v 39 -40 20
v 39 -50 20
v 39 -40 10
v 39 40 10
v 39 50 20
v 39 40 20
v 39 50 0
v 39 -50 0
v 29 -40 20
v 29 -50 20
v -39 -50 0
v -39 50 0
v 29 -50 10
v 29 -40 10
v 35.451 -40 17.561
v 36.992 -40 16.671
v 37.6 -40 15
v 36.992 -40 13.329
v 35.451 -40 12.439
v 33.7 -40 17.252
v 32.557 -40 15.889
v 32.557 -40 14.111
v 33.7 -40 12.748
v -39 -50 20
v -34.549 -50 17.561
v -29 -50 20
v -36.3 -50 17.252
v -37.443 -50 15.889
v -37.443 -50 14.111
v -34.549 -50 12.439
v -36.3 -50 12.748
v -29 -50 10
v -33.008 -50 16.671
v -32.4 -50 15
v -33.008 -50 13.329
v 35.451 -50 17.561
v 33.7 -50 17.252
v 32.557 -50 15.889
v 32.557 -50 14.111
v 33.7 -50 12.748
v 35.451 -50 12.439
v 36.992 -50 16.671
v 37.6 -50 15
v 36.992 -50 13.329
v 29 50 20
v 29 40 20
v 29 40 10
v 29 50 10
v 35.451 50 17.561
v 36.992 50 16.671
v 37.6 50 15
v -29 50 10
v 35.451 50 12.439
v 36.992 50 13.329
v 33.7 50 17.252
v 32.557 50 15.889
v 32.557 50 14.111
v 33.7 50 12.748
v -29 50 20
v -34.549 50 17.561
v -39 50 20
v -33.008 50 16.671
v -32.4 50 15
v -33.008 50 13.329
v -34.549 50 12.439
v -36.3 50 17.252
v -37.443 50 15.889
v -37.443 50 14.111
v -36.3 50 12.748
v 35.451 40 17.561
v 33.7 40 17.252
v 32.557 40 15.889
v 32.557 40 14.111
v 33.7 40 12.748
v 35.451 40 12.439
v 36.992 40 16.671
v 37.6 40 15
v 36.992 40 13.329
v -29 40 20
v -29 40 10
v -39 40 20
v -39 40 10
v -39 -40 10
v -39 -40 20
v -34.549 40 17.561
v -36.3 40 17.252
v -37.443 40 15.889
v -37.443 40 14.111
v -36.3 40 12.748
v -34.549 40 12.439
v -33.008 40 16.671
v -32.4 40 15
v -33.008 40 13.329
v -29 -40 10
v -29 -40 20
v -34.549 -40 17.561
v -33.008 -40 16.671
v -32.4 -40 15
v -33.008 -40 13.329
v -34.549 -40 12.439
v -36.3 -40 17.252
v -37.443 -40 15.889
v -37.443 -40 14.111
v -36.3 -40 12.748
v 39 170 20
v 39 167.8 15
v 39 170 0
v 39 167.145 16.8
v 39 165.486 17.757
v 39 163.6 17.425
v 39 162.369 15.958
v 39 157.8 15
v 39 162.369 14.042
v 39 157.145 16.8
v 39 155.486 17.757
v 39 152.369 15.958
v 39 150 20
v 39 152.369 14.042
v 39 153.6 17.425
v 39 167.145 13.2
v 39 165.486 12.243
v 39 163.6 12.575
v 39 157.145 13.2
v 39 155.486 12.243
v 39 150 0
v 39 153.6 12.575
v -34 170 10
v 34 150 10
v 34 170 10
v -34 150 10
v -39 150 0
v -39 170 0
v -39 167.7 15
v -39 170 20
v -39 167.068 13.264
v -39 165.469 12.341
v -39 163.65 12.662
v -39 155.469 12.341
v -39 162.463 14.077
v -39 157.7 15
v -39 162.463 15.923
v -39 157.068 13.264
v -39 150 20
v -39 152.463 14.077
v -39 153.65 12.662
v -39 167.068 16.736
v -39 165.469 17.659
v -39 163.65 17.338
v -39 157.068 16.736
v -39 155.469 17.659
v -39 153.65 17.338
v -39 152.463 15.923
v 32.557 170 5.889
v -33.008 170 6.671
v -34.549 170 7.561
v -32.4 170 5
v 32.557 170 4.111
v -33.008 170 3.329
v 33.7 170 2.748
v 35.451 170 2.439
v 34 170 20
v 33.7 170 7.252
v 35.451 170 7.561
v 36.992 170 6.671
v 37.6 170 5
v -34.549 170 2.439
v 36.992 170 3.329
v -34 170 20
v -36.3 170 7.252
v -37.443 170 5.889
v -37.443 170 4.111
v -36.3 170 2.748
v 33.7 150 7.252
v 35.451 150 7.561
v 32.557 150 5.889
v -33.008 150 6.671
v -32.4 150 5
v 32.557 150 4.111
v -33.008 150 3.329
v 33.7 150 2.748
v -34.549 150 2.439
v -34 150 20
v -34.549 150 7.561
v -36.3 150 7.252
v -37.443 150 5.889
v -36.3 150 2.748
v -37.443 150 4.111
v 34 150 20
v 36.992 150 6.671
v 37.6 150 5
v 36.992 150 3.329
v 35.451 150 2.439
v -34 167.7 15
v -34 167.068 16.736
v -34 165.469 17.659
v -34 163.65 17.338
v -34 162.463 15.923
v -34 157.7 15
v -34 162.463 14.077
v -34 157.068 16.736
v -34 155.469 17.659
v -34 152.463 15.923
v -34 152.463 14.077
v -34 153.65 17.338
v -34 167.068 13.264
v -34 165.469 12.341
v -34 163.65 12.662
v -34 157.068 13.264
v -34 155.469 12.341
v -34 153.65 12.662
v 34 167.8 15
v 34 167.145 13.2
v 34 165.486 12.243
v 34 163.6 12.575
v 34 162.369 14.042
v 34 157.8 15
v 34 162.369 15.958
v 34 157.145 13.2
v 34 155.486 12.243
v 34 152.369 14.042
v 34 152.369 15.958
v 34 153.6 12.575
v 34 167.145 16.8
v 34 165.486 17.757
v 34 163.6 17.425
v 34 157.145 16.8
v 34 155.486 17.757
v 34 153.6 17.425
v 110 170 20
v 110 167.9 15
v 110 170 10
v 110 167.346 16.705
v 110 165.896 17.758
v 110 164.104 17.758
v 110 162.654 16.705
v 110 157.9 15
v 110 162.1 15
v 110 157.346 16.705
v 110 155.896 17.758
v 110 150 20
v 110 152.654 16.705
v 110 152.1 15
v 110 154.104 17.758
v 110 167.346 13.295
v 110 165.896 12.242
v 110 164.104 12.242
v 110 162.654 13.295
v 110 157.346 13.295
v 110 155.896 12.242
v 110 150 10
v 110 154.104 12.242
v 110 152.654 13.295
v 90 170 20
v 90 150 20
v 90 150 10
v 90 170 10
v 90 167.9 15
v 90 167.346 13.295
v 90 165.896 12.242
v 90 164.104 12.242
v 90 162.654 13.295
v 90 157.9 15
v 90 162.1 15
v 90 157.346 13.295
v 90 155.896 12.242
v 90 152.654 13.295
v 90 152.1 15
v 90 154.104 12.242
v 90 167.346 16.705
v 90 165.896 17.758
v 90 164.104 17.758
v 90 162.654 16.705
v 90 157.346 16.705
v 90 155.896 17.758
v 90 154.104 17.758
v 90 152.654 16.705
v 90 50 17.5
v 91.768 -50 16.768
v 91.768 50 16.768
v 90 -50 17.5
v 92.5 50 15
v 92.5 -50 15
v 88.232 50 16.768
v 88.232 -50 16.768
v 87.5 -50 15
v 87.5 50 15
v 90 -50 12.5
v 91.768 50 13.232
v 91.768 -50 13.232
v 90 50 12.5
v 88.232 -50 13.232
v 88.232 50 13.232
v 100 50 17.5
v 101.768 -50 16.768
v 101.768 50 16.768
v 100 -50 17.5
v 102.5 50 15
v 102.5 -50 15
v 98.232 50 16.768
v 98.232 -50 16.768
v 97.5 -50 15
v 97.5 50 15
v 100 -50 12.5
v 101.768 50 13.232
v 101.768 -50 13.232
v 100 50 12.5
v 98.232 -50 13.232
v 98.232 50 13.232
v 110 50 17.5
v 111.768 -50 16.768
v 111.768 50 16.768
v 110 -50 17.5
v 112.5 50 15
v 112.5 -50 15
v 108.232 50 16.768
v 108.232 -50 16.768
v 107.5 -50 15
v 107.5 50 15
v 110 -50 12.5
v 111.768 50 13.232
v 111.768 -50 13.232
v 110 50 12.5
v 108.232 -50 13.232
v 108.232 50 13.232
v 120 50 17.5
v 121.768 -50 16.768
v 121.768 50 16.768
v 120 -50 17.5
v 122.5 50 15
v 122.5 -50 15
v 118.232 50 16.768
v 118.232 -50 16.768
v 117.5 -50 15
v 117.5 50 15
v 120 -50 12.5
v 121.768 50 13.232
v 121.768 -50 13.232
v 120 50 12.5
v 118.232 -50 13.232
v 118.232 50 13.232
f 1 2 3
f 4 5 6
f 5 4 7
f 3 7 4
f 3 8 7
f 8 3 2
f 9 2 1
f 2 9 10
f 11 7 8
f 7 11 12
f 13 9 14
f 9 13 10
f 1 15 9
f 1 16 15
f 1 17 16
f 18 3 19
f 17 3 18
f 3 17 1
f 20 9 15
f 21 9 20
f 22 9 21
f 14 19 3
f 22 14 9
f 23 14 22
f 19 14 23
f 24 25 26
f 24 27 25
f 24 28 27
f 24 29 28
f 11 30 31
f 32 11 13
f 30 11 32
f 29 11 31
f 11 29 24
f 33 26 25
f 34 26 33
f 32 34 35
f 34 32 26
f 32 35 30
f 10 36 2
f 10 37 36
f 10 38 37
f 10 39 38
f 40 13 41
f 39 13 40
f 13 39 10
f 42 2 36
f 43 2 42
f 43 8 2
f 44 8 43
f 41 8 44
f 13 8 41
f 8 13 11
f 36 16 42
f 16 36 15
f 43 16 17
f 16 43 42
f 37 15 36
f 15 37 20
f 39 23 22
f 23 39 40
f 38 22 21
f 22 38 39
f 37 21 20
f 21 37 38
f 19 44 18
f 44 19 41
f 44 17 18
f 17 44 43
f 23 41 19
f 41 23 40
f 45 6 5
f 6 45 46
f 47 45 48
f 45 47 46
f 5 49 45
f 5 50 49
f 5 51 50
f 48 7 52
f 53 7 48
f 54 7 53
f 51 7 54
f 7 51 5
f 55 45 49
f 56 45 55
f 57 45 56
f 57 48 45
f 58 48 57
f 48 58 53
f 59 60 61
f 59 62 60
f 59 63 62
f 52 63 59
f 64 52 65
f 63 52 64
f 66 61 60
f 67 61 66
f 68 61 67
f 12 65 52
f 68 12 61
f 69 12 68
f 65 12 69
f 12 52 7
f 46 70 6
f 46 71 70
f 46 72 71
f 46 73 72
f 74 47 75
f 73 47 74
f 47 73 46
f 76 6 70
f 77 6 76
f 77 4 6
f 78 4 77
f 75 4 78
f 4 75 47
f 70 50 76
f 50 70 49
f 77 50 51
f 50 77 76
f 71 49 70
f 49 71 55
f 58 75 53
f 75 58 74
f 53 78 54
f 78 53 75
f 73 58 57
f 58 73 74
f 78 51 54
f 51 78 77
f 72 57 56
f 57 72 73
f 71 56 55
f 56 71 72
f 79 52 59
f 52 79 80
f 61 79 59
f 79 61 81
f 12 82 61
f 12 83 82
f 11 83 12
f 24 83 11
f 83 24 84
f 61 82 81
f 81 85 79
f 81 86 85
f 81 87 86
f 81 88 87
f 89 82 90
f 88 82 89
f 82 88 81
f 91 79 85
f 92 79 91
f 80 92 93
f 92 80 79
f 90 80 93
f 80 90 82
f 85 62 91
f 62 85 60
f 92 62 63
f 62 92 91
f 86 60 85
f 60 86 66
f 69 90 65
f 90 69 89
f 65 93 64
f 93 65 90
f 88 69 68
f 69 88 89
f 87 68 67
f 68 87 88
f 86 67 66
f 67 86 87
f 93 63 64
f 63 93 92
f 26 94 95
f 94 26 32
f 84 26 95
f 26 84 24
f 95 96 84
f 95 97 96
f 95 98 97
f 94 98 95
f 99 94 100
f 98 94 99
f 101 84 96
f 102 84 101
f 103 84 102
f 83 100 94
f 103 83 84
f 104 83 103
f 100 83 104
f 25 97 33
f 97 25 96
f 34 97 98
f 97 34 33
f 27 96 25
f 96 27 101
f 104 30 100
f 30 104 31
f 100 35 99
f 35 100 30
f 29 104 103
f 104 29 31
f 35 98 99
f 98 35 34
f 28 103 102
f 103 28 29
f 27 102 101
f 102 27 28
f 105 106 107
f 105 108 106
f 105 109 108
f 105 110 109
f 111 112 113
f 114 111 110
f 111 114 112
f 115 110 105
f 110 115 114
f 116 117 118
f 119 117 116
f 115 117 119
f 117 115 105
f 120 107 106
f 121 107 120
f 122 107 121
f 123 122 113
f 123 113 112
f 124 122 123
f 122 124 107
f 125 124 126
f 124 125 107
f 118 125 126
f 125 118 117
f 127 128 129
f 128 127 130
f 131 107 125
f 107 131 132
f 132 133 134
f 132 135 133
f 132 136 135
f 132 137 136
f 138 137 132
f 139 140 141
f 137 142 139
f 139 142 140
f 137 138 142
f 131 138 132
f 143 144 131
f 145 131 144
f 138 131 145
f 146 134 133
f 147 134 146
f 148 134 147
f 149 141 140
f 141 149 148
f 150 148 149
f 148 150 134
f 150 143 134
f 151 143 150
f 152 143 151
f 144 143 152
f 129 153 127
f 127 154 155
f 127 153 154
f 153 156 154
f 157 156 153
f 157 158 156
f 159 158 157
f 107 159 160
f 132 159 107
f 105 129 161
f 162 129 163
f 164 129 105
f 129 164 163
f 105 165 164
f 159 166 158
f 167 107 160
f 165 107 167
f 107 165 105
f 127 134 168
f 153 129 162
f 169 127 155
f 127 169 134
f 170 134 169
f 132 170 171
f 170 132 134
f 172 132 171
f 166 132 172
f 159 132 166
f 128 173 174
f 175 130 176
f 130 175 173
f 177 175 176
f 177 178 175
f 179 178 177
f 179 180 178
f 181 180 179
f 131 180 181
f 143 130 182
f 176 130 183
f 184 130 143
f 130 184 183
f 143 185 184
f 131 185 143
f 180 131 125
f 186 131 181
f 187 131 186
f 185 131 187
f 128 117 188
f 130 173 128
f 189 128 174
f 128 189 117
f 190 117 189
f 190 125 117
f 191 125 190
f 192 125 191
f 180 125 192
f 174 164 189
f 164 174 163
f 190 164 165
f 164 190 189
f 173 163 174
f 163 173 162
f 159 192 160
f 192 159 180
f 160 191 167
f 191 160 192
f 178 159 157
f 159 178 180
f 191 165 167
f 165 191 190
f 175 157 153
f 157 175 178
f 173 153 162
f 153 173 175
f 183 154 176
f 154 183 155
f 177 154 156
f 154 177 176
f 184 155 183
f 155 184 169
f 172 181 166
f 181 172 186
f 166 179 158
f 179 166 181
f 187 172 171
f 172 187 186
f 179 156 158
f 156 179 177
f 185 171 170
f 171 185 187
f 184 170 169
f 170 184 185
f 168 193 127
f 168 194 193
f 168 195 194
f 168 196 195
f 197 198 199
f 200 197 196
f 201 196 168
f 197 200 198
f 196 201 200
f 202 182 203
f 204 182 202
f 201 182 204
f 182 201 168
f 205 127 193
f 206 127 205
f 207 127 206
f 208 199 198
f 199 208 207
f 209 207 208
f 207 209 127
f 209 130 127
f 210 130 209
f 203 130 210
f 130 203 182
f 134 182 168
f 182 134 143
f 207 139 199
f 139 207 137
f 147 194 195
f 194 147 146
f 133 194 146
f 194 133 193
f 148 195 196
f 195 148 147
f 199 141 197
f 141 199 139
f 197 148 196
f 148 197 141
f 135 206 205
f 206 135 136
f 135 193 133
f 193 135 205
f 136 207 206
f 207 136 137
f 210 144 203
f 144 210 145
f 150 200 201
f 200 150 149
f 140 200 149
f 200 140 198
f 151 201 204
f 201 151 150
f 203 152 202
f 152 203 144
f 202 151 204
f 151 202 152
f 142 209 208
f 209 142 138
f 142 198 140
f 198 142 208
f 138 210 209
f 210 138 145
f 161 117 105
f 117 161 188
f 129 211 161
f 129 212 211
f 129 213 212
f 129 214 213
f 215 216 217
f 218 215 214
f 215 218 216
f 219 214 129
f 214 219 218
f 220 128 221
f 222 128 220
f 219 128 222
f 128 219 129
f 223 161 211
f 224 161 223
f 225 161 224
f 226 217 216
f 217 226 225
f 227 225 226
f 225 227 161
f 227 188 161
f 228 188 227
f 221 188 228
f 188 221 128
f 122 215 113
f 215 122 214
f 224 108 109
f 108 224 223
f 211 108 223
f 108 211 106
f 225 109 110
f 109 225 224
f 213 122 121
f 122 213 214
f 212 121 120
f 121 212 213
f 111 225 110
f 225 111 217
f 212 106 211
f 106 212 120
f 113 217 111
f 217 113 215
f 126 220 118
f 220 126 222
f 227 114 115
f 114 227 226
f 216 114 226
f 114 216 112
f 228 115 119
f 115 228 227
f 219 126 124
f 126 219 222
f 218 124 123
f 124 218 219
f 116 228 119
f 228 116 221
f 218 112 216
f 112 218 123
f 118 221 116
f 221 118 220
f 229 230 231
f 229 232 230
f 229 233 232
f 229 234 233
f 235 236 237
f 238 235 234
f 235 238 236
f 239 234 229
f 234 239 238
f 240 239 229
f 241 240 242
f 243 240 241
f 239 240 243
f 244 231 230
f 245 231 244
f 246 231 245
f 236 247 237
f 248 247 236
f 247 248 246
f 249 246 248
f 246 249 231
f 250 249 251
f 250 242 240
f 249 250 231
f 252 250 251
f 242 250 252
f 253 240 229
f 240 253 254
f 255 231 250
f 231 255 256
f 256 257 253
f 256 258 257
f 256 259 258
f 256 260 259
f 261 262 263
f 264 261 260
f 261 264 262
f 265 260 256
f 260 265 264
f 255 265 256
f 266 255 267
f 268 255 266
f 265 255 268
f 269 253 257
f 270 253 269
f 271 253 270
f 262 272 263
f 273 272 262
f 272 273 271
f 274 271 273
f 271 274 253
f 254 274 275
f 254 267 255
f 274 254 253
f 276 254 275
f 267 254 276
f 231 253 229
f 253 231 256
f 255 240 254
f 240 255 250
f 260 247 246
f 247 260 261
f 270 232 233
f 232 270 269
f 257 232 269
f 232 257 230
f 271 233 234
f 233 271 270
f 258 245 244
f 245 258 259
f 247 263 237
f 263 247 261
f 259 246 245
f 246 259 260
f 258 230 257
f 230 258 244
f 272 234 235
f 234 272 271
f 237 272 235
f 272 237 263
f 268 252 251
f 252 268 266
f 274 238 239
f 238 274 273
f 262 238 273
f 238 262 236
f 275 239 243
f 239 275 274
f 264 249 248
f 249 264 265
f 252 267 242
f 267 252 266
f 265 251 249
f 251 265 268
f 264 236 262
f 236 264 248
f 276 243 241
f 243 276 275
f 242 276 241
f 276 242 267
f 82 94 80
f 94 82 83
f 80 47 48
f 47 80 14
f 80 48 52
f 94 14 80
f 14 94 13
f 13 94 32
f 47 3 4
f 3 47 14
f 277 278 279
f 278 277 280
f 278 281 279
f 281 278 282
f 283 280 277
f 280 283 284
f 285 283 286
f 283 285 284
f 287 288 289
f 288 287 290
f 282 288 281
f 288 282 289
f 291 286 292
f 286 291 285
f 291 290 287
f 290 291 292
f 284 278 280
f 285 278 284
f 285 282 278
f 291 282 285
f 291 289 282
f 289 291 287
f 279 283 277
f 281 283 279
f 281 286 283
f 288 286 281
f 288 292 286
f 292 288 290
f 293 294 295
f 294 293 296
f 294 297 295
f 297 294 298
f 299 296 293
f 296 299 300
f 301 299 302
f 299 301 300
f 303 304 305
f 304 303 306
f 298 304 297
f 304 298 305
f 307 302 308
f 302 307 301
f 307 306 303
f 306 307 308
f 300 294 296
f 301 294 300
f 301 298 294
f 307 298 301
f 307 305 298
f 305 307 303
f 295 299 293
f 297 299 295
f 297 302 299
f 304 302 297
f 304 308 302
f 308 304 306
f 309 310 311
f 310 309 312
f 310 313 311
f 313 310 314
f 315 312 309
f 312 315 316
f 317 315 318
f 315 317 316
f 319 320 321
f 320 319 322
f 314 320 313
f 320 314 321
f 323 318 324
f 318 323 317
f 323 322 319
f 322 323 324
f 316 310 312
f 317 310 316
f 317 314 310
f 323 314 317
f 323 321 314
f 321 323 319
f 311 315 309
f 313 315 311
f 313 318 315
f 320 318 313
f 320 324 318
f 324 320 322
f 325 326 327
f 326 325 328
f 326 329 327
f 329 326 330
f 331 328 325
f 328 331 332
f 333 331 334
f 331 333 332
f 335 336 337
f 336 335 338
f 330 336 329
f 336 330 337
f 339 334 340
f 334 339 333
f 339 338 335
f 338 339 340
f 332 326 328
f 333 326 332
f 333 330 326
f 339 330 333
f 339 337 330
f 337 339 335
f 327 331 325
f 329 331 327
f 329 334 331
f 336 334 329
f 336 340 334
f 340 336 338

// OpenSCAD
translate([-39,-50,0]) 

cube([78,100,10]);

rotate([90,0,0])

translate([90,15,-50]) 

cylinder(h=100,r=2.5);

rotate([90,0,0])

translate([100,15,-50]) 

cylinder(h=100,r=2.5);

rotate([90,0,0])

translate([110,15,-50]) 

cylinder(h=100,r=2.5);

rotate([90,0,0])

translate([120,15,-50]) 

cylinder(h=100,r=2.5);

difference(){

translate([29,-50,0]) 

cube([10,10,20]);

rotate([90,0,0])

translate([35,15,-100]) 

cylinder(h=200,r=2.6);

}

difference(){

translate([29,40,0]) 

cube([10,10,20]);

rotate([90,0,0])

translate([35,15,-100]) 

cylinder(h=100,r=2.6);

}

difference(){

translate([-39,40,0]) 

cube([10,10,20]);

rotate([90,0,0])

translate([-35,15,-50]) 

cylinder(h=100,r=2.6);

}

difference(){

translate([-39,-50,0]) 

cube([10,10,20]);

rotate([90,0,0])

translate([-35,15,-50]) 

cylinder(h=110,r=2.6);

}

difference(){

translate([-39,150,0]) 

cube([78,20,10]);

rotate([90,0,0])

translate([35,5,-200]) 

cylinder(h=110,r=2.6);

rotate([90,0,0])

translate([-35,5,-200]) 

cylinder(h=110,r=2.6);

}

difference(){

translate([-39,150,10]) 

cube([5,20,10]);

rotate([90,0,90])

translate([165,15,-45]) 

cylinder(h=100,r=2.7);

rotate([90,0,90])

translate([155,15,-45]) 

cylinder(h=100,r=2.7);

}

difference(){

translate([34,150,10]) 

cube([5,20,10]);

rotate([90,0,90])

translate([165,15,-45]) 

cylinder(h=100,r=2.8);

rotate([90,0,90])

translate([155,15,-45]) 

cylinder(h=100,r=2.8);

}

difference(){

translate([90,150,10]) 

cube([20,20,10]);

rotate([90,0,90])

translate([165,15,89]) 

cylinder(h=30,r=2.9);

rotate([90,0,90])

translate([155,15,89]) 

cylinder(h=30,r=2.9);

}
